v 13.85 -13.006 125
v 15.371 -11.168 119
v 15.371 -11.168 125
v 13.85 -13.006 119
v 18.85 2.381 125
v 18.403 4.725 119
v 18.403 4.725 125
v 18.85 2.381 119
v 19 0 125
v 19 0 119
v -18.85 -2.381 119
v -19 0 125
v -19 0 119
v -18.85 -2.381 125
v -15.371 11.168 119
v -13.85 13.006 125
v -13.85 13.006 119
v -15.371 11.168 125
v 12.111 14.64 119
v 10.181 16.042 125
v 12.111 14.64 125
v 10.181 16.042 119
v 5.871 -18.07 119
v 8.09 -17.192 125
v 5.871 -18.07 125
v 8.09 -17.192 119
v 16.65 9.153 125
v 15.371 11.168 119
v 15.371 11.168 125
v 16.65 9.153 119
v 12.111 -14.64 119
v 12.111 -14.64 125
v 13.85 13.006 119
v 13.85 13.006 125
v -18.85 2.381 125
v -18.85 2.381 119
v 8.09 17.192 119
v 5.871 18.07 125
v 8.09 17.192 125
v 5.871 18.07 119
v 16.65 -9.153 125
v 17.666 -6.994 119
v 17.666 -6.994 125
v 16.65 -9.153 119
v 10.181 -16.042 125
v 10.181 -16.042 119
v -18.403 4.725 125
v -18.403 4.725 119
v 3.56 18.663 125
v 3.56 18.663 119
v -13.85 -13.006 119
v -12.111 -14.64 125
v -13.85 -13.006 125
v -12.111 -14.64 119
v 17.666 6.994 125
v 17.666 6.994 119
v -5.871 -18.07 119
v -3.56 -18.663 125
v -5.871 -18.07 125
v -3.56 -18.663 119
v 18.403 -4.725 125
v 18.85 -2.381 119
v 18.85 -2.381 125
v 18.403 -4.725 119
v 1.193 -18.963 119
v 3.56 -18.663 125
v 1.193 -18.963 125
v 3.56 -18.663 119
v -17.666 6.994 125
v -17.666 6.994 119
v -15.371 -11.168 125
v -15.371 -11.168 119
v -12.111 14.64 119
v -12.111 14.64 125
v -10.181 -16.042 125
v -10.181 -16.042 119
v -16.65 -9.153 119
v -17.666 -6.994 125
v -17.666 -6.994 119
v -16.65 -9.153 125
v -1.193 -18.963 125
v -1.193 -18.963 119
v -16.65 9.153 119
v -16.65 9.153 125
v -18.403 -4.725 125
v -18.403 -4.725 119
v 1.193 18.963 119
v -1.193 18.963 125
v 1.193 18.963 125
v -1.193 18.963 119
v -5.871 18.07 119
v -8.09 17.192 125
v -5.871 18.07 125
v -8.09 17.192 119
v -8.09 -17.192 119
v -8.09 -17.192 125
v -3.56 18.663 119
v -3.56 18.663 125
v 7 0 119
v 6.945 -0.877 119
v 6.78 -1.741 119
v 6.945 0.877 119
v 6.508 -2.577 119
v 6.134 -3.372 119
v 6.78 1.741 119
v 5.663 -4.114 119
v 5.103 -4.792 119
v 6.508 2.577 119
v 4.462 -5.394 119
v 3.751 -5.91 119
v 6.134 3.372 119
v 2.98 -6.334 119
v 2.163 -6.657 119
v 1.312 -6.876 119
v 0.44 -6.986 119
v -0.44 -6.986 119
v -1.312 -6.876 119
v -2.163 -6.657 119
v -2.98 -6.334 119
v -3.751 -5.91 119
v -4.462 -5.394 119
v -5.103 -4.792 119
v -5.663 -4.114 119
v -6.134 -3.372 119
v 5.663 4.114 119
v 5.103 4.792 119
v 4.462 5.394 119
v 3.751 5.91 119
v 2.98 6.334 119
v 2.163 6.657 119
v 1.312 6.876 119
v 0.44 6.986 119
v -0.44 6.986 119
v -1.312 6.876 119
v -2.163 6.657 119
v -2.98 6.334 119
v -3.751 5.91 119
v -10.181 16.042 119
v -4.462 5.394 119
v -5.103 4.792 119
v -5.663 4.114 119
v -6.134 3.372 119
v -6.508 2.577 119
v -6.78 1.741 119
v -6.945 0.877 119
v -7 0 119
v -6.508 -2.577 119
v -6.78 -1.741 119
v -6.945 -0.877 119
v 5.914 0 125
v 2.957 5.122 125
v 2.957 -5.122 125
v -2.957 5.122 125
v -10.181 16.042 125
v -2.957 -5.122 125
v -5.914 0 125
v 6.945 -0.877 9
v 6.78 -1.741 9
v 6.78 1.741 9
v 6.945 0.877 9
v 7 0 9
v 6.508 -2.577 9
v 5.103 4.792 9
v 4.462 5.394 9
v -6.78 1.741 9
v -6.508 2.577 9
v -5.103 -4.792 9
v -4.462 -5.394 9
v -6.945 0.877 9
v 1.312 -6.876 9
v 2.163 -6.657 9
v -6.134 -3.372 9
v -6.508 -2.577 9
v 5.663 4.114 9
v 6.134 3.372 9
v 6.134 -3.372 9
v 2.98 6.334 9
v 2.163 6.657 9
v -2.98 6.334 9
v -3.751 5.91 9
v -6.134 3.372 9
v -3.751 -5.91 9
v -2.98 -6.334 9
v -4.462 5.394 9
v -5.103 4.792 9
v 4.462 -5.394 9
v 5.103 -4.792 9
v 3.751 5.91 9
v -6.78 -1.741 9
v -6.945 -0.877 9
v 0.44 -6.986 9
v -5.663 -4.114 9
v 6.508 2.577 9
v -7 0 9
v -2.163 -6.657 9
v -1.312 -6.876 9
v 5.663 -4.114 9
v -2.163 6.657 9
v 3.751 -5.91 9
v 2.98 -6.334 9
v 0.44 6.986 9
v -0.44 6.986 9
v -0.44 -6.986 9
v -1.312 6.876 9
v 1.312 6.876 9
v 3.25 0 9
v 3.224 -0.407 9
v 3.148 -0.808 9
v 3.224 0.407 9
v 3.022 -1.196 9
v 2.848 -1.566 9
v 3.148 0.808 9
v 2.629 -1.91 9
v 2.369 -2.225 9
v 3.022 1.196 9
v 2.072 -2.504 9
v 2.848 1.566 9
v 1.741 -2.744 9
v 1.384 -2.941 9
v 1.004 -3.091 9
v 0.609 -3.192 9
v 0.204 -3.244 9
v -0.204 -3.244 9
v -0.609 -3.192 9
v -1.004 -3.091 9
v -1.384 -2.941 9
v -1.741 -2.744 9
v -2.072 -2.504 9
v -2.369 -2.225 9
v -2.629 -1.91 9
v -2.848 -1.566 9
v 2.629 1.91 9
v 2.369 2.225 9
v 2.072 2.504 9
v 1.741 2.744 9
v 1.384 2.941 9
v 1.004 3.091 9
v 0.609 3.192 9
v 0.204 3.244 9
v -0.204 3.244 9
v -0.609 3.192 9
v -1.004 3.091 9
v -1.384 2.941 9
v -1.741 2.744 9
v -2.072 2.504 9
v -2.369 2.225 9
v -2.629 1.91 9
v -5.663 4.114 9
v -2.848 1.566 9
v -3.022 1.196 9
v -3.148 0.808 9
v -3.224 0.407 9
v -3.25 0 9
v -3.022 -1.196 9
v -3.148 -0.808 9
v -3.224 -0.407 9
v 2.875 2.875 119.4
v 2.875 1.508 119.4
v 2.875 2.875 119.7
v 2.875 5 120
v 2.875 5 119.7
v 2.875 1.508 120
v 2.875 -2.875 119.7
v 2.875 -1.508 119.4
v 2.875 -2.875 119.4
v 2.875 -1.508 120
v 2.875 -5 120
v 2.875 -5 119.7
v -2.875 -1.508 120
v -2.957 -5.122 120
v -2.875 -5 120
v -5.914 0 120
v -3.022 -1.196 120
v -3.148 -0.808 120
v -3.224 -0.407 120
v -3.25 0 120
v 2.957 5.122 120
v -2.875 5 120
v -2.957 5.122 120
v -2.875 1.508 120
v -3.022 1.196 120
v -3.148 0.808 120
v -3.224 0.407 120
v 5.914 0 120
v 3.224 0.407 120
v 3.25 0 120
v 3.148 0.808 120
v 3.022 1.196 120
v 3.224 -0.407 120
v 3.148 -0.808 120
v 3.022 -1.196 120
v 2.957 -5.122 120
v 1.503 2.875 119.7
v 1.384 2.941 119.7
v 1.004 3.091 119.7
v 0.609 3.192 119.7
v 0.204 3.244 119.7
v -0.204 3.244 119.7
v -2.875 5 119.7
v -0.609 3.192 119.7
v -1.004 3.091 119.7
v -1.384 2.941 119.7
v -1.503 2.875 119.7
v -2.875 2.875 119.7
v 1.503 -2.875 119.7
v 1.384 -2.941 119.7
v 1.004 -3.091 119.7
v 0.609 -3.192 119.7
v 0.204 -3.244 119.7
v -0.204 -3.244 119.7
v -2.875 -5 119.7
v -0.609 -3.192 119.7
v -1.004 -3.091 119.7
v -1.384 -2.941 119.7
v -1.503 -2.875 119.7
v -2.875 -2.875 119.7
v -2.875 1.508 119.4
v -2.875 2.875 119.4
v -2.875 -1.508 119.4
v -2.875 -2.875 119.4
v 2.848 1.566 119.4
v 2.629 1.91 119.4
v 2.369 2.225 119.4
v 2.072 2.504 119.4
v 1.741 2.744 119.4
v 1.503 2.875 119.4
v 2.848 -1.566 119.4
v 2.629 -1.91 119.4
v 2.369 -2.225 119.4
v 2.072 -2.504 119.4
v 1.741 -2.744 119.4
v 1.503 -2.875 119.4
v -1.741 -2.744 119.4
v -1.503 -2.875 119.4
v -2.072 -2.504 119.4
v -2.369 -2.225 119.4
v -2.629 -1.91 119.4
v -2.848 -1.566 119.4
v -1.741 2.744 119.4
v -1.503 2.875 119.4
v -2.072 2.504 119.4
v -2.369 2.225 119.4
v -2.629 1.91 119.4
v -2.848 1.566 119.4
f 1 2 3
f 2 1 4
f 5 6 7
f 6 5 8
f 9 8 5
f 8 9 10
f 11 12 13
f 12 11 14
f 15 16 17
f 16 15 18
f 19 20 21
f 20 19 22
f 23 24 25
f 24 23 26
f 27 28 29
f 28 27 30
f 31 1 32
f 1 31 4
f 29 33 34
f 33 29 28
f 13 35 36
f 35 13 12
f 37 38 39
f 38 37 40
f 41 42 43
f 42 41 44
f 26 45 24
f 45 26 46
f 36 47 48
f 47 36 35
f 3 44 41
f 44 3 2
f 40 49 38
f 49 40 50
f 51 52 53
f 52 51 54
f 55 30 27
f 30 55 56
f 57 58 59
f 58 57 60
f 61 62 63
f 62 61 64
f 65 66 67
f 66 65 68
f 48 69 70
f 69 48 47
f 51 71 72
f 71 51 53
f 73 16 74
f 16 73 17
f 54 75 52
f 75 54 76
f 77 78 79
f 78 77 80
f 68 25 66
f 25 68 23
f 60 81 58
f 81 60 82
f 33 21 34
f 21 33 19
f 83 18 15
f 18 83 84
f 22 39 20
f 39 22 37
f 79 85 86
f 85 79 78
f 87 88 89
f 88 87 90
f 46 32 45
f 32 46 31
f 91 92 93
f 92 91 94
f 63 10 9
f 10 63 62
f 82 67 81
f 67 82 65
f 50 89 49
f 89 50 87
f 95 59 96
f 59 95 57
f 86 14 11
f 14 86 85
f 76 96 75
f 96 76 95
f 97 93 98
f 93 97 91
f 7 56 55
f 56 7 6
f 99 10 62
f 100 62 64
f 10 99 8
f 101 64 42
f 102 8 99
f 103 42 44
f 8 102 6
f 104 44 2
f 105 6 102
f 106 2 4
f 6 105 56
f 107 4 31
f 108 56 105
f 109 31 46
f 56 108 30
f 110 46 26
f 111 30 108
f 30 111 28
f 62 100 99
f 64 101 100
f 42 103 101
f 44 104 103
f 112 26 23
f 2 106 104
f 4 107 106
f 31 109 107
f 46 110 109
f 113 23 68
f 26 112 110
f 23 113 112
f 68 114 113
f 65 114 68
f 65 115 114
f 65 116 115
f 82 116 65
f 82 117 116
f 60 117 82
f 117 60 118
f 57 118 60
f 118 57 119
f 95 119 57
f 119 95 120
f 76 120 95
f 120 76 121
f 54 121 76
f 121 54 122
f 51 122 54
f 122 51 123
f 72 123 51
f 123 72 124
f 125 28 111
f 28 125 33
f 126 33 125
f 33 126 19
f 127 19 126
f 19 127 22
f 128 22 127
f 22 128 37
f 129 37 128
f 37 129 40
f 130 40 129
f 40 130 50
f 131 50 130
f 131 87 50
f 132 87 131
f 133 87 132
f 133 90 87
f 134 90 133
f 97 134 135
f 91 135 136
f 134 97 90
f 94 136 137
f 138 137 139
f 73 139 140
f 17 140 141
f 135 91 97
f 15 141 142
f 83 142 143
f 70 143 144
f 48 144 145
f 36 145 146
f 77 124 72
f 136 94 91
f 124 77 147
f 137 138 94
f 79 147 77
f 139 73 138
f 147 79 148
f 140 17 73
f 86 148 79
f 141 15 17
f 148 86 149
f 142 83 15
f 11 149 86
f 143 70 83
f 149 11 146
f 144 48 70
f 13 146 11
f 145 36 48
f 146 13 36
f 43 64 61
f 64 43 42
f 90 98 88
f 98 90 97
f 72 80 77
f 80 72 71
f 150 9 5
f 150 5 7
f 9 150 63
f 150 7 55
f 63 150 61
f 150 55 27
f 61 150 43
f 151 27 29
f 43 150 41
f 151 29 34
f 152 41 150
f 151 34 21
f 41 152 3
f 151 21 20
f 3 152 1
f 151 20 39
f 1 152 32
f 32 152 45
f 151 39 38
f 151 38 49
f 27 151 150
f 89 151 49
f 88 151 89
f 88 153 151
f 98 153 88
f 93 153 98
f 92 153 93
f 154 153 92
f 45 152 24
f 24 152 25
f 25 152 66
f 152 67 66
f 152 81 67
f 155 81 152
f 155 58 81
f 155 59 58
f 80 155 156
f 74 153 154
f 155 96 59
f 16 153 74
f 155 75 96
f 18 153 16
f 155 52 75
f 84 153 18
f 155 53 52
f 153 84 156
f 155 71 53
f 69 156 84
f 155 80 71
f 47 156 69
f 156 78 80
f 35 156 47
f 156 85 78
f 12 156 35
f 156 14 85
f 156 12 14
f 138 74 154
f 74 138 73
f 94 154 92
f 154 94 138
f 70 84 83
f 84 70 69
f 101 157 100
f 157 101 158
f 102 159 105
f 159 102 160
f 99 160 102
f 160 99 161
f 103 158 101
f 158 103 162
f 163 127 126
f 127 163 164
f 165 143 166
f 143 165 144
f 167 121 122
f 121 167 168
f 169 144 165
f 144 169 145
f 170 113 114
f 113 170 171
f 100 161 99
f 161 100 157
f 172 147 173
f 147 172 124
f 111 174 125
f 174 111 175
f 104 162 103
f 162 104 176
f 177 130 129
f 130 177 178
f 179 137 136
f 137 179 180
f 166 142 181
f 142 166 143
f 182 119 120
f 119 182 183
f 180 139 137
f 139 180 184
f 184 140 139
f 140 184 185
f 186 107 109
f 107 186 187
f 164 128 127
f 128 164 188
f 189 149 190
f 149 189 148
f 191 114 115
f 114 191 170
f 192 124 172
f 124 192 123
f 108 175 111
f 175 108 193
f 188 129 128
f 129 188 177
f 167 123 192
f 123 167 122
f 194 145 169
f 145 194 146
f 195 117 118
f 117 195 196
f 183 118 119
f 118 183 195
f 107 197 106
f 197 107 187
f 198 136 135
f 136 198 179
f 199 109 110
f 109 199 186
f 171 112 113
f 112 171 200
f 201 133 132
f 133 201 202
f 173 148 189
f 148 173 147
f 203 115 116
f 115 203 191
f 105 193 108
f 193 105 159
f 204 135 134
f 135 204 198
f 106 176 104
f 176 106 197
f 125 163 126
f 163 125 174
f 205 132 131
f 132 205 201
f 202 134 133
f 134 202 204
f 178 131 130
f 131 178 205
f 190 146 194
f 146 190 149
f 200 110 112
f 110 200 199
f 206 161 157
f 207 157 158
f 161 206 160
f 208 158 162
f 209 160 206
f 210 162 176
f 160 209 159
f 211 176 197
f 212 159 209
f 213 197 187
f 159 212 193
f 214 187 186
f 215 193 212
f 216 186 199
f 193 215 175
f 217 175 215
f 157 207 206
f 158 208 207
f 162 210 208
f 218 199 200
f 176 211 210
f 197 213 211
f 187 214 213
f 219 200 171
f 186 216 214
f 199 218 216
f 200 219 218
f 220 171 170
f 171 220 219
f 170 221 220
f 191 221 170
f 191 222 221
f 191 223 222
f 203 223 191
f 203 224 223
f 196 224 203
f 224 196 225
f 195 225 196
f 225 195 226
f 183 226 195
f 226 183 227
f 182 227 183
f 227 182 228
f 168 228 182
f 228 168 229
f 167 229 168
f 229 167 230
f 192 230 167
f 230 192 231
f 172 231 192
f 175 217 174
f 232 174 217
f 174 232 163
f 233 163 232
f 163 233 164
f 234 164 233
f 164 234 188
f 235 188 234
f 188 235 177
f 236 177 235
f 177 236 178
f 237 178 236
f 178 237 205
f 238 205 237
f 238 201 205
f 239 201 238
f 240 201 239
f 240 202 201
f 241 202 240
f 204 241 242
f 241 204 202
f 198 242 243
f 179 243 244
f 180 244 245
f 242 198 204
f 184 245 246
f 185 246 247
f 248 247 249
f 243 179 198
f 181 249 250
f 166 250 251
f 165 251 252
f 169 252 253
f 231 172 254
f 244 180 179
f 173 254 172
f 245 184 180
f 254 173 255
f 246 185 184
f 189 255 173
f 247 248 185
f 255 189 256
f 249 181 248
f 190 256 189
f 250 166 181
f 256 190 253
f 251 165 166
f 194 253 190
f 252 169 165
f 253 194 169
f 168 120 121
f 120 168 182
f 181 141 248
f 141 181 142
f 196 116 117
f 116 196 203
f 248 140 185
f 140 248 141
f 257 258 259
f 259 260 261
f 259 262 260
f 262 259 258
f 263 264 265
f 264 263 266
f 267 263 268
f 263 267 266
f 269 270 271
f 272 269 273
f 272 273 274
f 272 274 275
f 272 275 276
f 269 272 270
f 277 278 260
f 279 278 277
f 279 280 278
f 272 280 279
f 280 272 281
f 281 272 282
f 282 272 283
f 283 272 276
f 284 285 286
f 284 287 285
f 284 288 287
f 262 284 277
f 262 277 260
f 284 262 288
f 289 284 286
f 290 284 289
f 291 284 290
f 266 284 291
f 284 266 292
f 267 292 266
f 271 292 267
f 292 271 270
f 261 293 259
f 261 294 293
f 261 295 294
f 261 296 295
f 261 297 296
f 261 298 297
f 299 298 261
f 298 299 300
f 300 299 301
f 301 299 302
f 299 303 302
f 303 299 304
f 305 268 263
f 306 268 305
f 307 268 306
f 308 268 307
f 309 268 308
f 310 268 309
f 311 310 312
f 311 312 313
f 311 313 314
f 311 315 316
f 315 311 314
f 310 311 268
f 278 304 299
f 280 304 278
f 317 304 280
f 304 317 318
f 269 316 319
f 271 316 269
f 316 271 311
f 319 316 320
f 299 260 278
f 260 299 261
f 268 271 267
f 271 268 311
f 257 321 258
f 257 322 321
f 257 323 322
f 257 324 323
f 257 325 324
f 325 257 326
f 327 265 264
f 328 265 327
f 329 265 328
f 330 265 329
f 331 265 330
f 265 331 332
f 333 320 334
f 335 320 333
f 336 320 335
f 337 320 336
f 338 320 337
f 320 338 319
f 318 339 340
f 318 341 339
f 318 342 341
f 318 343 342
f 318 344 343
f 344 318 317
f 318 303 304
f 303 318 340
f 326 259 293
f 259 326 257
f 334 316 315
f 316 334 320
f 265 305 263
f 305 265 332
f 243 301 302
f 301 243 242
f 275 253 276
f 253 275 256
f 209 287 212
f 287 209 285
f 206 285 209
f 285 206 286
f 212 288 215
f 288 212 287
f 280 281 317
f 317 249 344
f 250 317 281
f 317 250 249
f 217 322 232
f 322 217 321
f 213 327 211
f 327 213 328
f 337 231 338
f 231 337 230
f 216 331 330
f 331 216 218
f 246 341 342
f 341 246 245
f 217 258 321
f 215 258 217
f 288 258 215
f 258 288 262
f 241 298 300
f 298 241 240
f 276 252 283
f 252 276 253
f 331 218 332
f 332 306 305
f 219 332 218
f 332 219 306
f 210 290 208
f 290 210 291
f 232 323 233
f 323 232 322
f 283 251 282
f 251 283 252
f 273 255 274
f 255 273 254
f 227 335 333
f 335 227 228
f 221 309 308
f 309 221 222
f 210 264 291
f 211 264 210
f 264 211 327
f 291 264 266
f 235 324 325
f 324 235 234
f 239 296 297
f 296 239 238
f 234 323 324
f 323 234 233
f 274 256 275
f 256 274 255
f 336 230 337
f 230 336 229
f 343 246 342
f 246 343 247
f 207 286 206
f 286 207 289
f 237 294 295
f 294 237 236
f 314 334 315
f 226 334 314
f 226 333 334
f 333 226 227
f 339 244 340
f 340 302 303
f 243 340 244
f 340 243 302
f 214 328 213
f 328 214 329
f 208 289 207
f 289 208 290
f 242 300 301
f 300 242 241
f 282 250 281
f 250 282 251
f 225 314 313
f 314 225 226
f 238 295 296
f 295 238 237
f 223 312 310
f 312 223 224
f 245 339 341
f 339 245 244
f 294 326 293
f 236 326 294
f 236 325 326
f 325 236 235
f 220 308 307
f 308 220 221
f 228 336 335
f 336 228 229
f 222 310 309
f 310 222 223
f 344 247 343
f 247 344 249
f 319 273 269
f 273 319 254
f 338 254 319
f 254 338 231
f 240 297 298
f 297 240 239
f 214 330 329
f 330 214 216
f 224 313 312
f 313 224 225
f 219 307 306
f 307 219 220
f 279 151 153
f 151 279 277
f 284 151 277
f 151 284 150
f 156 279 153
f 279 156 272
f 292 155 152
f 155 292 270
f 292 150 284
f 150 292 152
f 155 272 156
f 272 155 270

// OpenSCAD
$fn = 50;


difference() {
	union() {
		translate(v = [0, 0, 119.0000000000]) {
			cylinder(h = 6, r = 19.0000000000);
		}
		translate(v = [0, 0, 9.0000000000]) {
			cylinder(h = 116, r = 7.0000000000);
		}
	}
	union() {
		translate(v = [0, 0, 125]) {
			rotate(a = [0, 0, 0]) {
				difference() {
					union() {
						#translate(v = [-2.8750000000, -5.0000000000, -5.3000000000]) {
							cube(size = [5.7500000000, 10, 0.3000000000]);
						}
						#translate(v = [-2.8750000000, -2.8750000000, -5.6000000000]) {
							cube(size = [5.7500000000, 5.7500000000, 0.3000000000]);
						}
						#translate(v = [-2.8750000000, -5.0000000000, 0]) {
							cube(size = [5.7500000000, 10, 0.3000000000]);
						}
						#translate(v = [-2.8750000000, -2.8750000000, 0.3000000000]) {
							cube(size = [5.7500000000, 5.7500000000, 0.3000000000]);
						}
						#translate(v = [0, 0, -100.0000000000]) {
							cylinder(h = 200, r = 3.2500000000);
						}
						translate(v = [0, 0, -5]) {
							#linear_extrude(height = 5) {
								polygon(points = [[5.9142500000, 0.0000000000], [2.9571250000, 5.1218907443], [-2.9571250000, 5.1218907443], [-5.9142500000, 0.0000000000], [-2.9571250000, -5.1218907443], [2.9571250000, -5.1218907443]]);
							}
						}
						#translate(v = [-2.8750000000, -5.0000000000, -5.3000000000]) {
							cube(size = [5.7500000000, 10, 0.3000000000]);
						}
						#translate(v = [-2.8750000000, -2.8750000000, -5.6000000000]) {
							cube(size = [5.7500000000, 5.7500000000, 0.3000000000]);
						}
						#translate(v = [-2.8750000000, -5.0000000000, 0]) {
							cube(size = [5.7500000000, 10, 0.3000000000]);
						}
						#translate(v = [-2.8750000000, -2.8750000000, 0.3000000000]) {
							cube(size = [5.7500000000, 5.7500000000, 0.3000000000]);
						}
						#translate(v = [0, 0, -100.0000000000]) {
							cylinder(h = 200, r = 3.2500000000);
						}
						#translate(v = [-2.8750000000, -5.0000000000, -5.3000000000]) {
							cube(size = [5.7500000000, 10, 0.3000000000]);
						}
						#translate(v = [-2.8750000000, -2.8750000000, -5.6000000000]) {
							cube(size = [5.7500000000, 5.7500000000, 0.3000000000]);
						}
						#translate(v = [-2.8750000000, -5.0000000000, 0]) {
							cube(size = [5.7500000000, 10, 0.3000000000]);
						}
						#translate(v = [-2.8750000000, -2.8750000000, 0.3000000000]) {
							cube(size = [5.7500000000, 5.7500000000, 0.3000000000]);
						}
						#translate(v = [0, 0, -100.0000000000]) {
							cylinder(h = 200, r = 3.2500000000);
						}
					}
					union();
				}
			}
		}
		#translate(v = [0, 0, -100.0000000000]) {
			cylinder(h = 200, r = 3.2500000000);
		}
	}
}
